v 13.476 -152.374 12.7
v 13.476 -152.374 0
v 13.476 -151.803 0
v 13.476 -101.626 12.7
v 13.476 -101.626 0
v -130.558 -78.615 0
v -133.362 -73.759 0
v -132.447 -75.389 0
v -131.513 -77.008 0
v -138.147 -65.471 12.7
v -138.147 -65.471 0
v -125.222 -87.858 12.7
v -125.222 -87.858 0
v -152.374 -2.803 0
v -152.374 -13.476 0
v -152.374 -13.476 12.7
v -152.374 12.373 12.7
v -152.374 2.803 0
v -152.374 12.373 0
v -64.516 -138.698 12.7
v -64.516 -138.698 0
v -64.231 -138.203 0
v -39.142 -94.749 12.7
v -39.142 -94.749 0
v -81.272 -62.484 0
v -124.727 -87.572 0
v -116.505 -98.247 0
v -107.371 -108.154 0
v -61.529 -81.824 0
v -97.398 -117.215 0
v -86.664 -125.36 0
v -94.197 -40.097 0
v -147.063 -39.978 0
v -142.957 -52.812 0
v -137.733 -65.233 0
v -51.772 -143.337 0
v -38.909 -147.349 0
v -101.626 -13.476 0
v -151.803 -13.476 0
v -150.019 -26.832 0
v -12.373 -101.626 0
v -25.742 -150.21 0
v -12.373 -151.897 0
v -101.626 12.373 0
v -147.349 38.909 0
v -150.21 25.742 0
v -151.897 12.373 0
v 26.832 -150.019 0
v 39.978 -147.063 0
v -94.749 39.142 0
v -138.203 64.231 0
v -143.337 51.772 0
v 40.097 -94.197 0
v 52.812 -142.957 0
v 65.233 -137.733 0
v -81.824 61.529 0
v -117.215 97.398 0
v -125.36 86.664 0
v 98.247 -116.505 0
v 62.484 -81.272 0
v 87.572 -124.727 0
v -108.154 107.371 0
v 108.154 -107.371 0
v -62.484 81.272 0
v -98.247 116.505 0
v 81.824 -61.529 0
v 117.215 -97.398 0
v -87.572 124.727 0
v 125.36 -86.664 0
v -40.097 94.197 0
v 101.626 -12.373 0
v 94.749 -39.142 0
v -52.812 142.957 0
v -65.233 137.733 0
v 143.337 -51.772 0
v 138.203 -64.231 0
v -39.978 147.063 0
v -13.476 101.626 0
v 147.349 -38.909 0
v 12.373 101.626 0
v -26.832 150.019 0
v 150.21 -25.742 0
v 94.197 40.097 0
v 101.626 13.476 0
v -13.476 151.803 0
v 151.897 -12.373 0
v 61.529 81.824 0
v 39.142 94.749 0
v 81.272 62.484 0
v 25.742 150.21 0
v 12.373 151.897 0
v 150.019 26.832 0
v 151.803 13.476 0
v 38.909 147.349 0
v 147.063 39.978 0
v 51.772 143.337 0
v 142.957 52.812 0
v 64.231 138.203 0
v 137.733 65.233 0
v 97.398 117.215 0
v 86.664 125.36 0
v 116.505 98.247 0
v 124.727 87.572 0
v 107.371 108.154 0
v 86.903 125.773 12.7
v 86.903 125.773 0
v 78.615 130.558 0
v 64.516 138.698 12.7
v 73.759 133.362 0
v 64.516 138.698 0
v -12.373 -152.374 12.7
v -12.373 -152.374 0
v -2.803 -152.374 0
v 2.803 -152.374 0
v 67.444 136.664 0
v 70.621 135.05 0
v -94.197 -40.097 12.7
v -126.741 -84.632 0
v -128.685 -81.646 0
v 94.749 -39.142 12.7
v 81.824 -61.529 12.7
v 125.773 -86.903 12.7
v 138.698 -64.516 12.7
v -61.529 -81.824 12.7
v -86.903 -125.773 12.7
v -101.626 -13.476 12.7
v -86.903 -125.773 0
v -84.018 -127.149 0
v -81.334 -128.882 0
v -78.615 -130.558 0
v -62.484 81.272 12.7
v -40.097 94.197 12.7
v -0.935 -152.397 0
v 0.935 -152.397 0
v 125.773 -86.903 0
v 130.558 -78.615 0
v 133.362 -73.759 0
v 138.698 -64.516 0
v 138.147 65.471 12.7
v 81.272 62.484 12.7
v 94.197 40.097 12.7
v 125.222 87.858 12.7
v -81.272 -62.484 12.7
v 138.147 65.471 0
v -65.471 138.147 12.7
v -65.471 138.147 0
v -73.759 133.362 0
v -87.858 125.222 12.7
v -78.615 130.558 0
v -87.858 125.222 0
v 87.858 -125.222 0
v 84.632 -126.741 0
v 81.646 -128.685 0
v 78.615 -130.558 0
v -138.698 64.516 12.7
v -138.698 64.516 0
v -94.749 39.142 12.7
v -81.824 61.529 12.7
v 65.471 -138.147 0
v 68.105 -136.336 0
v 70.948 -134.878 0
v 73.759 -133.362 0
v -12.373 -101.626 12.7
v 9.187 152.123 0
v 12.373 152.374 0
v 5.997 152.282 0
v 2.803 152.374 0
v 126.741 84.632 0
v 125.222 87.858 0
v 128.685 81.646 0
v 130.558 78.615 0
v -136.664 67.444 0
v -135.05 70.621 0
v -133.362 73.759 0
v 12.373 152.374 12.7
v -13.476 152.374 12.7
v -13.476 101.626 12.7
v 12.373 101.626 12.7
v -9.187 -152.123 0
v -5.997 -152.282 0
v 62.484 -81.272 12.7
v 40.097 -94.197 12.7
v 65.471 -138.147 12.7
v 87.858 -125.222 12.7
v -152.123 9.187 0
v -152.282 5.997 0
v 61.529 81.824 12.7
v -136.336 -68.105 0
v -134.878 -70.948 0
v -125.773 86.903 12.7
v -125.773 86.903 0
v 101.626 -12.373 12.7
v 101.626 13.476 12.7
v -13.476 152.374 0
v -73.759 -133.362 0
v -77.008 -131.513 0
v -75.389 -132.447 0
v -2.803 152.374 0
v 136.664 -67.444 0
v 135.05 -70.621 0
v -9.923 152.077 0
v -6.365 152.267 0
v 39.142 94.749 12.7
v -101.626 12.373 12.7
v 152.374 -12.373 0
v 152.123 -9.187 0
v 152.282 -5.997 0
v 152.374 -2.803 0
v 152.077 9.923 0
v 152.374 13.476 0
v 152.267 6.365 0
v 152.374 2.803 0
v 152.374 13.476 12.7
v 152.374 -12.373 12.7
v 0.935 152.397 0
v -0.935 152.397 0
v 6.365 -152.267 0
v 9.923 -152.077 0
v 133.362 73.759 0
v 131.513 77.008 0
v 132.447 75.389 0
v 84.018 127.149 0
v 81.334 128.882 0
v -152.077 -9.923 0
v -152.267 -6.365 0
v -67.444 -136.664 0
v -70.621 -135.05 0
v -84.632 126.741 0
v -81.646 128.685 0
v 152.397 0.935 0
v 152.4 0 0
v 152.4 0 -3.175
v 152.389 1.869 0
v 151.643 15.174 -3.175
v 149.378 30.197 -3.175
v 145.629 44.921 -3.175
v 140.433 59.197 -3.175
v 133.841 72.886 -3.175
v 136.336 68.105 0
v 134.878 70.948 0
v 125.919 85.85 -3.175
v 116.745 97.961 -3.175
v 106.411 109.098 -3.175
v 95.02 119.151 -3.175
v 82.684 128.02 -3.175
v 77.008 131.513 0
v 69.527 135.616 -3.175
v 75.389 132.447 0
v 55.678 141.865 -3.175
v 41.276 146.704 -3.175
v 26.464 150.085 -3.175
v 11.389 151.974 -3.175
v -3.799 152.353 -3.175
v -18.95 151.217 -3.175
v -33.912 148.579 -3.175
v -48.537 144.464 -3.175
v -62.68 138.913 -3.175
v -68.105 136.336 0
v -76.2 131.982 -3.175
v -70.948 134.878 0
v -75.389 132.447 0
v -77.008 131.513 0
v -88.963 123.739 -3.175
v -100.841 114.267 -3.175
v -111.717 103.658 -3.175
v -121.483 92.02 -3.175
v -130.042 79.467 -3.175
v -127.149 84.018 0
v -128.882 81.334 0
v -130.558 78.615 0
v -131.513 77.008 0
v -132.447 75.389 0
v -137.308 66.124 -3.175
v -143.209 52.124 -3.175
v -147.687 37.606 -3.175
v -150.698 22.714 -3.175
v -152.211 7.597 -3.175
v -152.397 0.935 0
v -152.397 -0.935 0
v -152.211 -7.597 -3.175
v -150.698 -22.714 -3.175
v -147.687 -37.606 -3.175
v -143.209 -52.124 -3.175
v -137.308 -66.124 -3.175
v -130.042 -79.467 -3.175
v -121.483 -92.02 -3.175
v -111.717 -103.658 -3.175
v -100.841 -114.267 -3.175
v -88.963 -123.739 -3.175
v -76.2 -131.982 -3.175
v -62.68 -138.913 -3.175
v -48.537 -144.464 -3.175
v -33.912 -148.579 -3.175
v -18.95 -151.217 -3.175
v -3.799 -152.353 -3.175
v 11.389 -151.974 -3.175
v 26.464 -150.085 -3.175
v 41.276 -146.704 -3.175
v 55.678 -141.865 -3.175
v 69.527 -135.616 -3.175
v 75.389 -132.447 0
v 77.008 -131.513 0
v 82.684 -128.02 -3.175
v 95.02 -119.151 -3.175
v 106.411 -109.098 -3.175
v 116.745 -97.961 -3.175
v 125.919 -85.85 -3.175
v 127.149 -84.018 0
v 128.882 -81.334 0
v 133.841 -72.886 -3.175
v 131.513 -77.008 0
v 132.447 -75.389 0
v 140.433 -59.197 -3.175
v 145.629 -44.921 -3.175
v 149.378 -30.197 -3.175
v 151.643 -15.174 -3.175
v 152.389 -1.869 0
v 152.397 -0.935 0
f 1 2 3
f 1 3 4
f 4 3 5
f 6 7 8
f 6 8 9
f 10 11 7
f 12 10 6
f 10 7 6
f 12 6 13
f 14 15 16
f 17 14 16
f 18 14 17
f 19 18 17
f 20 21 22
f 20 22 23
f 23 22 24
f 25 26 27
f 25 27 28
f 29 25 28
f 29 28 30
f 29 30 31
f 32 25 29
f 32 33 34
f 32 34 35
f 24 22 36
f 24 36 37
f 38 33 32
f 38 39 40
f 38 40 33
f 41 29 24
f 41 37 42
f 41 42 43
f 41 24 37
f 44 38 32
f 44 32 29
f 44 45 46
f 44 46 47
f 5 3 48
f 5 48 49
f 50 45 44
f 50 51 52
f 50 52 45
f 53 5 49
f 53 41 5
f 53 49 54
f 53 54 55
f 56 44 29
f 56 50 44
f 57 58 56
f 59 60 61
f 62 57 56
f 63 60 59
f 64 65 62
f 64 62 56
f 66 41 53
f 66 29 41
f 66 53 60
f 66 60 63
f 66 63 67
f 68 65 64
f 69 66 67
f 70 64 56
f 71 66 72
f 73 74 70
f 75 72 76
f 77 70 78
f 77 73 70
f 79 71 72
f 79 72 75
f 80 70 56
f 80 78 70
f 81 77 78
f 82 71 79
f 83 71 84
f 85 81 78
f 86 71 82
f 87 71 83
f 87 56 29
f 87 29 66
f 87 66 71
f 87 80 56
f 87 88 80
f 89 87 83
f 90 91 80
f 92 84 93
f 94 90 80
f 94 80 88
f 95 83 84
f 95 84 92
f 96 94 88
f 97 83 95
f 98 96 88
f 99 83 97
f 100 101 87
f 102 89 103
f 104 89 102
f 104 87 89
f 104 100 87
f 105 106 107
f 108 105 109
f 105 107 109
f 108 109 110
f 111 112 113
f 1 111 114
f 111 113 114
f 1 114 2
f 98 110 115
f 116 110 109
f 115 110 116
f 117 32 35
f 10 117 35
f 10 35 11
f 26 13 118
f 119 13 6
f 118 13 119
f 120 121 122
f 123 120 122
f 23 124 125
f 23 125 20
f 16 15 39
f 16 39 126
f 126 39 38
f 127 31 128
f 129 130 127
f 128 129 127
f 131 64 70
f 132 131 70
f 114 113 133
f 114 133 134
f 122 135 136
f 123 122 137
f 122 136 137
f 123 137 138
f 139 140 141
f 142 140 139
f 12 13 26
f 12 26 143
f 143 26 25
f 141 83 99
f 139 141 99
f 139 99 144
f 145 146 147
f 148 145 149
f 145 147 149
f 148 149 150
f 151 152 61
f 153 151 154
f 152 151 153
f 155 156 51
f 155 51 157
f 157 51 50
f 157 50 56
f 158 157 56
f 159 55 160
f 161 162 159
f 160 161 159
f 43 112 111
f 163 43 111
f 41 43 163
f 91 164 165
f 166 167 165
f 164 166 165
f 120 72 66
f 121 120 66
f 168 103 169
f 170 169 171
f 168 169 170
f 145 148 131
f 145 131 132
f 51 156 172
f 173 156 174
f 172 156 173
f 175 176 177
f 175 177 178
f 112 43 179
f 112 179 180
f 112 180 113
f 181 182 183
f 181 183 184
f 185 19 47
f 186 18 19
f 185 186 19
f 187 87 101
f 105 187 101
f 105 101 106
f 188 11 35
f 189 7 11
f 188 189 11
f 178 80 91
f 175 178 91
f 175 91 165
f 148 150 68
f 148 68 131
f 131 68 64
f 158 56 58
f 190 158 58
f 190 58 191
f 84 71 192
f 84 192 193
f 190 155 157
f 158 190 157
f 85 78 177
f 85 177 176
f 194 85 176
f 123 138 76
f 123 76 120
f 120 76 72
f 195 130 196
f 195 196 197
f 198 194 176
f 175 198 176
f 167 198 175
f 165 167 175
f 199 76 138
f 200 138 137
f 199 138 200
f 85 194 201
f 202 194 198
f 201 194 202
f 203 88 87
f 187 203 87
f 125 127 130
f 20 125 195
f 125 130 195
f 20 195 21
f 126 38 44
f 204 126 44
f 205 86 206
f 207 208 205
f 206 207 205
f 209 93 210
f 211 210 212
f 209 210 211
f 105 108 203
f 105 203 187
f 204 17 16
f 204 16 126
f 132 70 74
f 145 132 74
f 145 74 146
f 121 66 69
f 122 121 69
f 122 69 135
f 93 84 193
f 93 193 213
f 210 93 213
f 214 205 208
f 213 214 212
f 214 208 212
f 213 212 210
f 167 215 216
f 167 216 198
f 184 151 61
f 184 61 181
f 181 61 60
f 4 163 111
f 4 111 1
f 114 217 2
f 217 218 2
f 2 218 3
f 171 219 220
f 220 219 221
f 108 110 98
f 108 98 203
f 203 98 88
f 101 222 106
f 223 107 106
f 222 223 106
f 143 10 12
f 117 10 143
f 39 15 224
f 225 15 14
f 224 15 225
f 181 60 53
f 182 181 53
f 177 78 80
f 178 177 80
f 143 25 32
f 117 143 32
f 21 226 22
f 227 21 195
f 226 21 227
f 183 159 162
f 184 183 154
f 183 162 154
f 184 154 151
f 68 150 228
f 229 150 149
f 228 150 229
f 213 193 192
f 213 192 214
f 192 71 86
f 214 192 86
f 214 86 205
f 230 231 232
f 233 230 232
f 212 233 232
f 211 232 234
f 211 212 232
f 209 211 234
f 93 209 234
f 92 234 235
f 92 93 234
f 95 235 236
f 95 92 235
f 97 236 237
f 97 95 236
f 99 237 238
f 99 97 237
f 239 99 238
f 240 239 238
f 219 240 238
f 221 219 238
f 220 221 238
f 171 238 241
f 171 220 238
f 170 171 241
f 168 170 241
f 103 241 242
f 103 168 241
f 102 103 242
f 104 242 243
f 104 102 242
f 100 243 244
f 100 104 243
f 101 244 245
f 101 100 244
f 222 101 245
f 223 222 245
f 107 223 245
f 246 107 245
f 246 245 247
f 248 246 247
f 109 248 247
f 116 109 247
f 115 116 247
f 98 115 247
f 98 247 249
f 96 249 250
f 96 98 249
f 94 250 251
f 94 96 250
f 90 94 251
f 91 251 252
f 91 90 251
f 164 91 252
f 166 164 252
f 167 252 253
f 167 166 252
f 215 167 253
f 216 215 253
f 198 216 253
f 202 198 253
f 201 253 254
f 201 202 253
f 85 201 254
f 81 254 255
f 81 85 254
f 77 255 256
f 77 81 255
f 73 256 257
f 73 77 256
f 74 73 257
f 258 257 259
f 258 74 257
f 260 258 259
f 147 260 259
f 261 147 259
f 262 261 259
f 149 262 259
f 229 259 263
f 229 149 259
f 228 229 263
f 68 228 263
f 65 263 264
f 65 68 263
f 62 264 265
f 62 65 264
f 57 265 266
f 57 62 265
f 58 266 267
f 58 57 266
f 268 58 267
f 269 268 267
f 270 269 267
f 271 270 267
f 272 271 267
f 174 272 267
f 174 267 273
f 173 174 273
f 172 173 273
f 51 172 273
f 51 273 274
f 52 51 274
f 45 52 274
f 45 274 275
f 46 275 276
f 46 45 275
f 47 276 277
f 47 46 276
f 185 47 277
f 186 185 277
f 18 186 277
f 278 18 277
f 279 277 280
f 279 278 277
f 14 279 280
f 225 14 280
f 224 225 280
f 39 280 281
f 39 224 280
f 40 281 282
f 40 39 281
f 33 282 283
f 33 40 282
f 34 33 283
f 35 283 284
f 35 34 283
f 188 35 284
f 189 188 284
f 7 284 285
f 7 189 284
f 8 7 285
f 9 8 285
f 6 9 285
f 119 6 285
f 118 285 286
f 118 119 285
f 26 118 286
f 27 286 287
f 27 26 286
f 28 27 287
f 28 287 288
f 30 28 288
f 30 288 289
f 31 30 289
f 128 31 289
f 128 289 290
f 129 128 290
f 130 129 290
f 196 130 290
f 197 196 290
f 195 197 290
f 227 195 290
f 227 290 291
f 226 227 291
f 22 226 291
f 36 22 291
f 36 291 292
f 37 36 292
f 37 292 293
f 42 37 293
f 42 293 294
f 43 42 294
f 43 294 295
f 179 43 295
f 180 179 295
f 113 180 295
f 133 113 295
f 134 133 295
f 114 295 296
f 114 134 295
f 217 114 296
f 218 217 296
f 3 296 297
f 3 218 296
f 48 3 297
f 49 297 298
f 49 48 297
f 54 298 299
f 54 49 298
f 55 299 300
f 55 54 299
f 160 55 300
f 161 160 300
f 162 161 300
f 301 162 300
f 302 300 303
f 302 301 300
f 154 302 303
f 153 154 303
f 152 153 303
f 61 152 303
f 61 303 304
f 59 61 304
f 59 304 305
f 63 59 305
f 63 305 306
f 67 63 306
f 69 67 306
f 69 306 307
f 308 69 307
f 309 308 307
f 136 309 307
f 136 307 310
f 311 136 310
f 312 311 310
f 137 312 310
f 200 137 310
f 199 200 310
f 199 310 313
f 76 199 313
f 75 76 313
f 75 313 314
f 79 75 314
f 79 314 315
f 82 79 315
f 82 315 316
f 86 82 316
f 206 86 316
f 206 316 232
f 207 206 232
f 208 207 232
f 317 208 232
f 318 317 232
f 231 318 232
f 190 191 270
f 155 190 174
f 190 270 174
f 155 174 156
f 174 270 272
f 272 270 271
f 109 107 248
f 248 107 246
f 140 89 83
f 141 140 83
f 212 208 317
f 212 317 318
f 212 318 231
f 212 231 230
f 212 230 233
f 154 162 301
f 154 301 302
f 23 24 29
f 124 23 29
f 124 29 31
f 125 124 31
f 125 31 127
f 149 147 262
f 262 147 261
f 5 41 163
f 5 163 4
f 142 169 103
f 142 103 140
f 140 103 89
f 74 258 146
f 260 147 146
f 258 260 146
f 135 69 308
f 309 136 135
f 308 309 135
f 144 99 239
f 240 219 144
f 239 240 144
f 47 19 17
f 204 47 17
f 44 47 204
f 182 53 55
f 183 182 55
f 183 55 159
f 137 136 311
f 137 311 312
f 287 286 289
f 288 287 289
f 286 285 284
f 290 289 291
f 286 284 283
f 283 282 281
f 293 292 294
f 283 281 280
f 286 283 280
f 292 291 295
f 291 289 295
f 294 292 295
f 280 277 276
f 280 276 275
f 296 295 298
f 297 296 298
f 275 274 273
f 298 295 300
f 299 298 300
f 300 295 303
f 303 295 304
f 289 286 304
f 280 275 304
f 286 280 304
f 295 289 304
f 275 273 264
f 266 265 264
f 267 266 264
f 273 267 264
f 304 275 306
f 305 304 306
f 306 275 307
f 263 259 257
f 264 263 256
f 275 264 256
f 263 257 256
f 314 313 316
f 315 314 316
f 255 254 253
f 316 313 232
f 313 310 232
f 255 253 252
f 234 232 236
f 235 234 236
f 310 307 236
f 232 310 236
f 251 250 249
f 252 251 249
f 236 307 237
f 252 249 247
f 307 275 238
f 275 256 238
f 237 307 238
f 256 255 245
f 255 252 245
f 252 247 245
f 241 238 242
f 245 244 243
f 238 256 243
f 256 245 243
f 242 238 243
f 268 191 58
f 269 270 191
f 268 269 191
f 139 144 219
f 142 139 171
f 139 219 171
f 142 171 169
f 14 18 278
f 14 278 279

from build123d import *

# Parameters (mm, degrees)
F0_W     = 25.849619
F0_H     = 50.748426
F0_W_2   = 50.748426
F0_H_2   = 25.849619
F1_DEPTH = 12.7
F2_R     = 152.4
F3_DEPTH = 3.175


with BuildPart() as f1:
    # F0 (on Top) → F1 (new body)
    with BuildSketch(Plane.XY):
        with Locations((-0.551344, 127)):
            Rectangle(F0_W, F0_H)
        Polygon((-40.097159, 94.197246), (-65.471372, 138.146671), (-87.857798, 125.221862), (-62.483585, 81.272437), align=None)
        Polygon((-81.823781, 61.528628), (-125.773207, 86.902841), (-138.698016, 64.516415), (-94.748591, 39.142202), align=None)
        with Locations((-127, -0.551344)):
            Rectangle(F0_W_2, F0_H_2)
        Polygon((-94.197246, -40.097159), (-138.146671, -65.471372), (-125.221862, -87.857798), (-81.272437, -62.483585), align=None)
        Polygon((-61.528628, -81.823781), (-86.902841, -125.773207), (-64.516415, -138.698016), (-39.142202, -94.748591), align=None)
        with Locations((0.551344, -127)):
            Rectangle(F0_W, F0_H)
        Polygon((40.097159, -94.197246), (65.471372, -138.146671), (87.857798, -125.221862), (62.483585, -81.272437), align=None)
        Polygon((81.823781, -61.528628), (125.773207, -86.902841), (138.698016, -64.516415), (94.748591, -39.142202), align=None)
        with Locations((127, 0.551344)):
            Rectangle(F0_W_2, F0_H_2)
        Polygon((94.197246, 40.097159), (138.146671, 65.471372), (125.221862, 87.857798), (81.272437, 62.483585), align=None)
        Polygon((61.528628, 81.823781), (86.902841, 125.773207), (64.516415, 138.698016), (39.142202, 94.748591), align=None)
    extrude(amount=F1_DEPTH)

    # F2 (on Top) → F3 (join)
    with BuildSketch(Plane.XY):
        Circle(F2_R)
    extrude(amount=-F3_DEPTH)


solid = f1.part
